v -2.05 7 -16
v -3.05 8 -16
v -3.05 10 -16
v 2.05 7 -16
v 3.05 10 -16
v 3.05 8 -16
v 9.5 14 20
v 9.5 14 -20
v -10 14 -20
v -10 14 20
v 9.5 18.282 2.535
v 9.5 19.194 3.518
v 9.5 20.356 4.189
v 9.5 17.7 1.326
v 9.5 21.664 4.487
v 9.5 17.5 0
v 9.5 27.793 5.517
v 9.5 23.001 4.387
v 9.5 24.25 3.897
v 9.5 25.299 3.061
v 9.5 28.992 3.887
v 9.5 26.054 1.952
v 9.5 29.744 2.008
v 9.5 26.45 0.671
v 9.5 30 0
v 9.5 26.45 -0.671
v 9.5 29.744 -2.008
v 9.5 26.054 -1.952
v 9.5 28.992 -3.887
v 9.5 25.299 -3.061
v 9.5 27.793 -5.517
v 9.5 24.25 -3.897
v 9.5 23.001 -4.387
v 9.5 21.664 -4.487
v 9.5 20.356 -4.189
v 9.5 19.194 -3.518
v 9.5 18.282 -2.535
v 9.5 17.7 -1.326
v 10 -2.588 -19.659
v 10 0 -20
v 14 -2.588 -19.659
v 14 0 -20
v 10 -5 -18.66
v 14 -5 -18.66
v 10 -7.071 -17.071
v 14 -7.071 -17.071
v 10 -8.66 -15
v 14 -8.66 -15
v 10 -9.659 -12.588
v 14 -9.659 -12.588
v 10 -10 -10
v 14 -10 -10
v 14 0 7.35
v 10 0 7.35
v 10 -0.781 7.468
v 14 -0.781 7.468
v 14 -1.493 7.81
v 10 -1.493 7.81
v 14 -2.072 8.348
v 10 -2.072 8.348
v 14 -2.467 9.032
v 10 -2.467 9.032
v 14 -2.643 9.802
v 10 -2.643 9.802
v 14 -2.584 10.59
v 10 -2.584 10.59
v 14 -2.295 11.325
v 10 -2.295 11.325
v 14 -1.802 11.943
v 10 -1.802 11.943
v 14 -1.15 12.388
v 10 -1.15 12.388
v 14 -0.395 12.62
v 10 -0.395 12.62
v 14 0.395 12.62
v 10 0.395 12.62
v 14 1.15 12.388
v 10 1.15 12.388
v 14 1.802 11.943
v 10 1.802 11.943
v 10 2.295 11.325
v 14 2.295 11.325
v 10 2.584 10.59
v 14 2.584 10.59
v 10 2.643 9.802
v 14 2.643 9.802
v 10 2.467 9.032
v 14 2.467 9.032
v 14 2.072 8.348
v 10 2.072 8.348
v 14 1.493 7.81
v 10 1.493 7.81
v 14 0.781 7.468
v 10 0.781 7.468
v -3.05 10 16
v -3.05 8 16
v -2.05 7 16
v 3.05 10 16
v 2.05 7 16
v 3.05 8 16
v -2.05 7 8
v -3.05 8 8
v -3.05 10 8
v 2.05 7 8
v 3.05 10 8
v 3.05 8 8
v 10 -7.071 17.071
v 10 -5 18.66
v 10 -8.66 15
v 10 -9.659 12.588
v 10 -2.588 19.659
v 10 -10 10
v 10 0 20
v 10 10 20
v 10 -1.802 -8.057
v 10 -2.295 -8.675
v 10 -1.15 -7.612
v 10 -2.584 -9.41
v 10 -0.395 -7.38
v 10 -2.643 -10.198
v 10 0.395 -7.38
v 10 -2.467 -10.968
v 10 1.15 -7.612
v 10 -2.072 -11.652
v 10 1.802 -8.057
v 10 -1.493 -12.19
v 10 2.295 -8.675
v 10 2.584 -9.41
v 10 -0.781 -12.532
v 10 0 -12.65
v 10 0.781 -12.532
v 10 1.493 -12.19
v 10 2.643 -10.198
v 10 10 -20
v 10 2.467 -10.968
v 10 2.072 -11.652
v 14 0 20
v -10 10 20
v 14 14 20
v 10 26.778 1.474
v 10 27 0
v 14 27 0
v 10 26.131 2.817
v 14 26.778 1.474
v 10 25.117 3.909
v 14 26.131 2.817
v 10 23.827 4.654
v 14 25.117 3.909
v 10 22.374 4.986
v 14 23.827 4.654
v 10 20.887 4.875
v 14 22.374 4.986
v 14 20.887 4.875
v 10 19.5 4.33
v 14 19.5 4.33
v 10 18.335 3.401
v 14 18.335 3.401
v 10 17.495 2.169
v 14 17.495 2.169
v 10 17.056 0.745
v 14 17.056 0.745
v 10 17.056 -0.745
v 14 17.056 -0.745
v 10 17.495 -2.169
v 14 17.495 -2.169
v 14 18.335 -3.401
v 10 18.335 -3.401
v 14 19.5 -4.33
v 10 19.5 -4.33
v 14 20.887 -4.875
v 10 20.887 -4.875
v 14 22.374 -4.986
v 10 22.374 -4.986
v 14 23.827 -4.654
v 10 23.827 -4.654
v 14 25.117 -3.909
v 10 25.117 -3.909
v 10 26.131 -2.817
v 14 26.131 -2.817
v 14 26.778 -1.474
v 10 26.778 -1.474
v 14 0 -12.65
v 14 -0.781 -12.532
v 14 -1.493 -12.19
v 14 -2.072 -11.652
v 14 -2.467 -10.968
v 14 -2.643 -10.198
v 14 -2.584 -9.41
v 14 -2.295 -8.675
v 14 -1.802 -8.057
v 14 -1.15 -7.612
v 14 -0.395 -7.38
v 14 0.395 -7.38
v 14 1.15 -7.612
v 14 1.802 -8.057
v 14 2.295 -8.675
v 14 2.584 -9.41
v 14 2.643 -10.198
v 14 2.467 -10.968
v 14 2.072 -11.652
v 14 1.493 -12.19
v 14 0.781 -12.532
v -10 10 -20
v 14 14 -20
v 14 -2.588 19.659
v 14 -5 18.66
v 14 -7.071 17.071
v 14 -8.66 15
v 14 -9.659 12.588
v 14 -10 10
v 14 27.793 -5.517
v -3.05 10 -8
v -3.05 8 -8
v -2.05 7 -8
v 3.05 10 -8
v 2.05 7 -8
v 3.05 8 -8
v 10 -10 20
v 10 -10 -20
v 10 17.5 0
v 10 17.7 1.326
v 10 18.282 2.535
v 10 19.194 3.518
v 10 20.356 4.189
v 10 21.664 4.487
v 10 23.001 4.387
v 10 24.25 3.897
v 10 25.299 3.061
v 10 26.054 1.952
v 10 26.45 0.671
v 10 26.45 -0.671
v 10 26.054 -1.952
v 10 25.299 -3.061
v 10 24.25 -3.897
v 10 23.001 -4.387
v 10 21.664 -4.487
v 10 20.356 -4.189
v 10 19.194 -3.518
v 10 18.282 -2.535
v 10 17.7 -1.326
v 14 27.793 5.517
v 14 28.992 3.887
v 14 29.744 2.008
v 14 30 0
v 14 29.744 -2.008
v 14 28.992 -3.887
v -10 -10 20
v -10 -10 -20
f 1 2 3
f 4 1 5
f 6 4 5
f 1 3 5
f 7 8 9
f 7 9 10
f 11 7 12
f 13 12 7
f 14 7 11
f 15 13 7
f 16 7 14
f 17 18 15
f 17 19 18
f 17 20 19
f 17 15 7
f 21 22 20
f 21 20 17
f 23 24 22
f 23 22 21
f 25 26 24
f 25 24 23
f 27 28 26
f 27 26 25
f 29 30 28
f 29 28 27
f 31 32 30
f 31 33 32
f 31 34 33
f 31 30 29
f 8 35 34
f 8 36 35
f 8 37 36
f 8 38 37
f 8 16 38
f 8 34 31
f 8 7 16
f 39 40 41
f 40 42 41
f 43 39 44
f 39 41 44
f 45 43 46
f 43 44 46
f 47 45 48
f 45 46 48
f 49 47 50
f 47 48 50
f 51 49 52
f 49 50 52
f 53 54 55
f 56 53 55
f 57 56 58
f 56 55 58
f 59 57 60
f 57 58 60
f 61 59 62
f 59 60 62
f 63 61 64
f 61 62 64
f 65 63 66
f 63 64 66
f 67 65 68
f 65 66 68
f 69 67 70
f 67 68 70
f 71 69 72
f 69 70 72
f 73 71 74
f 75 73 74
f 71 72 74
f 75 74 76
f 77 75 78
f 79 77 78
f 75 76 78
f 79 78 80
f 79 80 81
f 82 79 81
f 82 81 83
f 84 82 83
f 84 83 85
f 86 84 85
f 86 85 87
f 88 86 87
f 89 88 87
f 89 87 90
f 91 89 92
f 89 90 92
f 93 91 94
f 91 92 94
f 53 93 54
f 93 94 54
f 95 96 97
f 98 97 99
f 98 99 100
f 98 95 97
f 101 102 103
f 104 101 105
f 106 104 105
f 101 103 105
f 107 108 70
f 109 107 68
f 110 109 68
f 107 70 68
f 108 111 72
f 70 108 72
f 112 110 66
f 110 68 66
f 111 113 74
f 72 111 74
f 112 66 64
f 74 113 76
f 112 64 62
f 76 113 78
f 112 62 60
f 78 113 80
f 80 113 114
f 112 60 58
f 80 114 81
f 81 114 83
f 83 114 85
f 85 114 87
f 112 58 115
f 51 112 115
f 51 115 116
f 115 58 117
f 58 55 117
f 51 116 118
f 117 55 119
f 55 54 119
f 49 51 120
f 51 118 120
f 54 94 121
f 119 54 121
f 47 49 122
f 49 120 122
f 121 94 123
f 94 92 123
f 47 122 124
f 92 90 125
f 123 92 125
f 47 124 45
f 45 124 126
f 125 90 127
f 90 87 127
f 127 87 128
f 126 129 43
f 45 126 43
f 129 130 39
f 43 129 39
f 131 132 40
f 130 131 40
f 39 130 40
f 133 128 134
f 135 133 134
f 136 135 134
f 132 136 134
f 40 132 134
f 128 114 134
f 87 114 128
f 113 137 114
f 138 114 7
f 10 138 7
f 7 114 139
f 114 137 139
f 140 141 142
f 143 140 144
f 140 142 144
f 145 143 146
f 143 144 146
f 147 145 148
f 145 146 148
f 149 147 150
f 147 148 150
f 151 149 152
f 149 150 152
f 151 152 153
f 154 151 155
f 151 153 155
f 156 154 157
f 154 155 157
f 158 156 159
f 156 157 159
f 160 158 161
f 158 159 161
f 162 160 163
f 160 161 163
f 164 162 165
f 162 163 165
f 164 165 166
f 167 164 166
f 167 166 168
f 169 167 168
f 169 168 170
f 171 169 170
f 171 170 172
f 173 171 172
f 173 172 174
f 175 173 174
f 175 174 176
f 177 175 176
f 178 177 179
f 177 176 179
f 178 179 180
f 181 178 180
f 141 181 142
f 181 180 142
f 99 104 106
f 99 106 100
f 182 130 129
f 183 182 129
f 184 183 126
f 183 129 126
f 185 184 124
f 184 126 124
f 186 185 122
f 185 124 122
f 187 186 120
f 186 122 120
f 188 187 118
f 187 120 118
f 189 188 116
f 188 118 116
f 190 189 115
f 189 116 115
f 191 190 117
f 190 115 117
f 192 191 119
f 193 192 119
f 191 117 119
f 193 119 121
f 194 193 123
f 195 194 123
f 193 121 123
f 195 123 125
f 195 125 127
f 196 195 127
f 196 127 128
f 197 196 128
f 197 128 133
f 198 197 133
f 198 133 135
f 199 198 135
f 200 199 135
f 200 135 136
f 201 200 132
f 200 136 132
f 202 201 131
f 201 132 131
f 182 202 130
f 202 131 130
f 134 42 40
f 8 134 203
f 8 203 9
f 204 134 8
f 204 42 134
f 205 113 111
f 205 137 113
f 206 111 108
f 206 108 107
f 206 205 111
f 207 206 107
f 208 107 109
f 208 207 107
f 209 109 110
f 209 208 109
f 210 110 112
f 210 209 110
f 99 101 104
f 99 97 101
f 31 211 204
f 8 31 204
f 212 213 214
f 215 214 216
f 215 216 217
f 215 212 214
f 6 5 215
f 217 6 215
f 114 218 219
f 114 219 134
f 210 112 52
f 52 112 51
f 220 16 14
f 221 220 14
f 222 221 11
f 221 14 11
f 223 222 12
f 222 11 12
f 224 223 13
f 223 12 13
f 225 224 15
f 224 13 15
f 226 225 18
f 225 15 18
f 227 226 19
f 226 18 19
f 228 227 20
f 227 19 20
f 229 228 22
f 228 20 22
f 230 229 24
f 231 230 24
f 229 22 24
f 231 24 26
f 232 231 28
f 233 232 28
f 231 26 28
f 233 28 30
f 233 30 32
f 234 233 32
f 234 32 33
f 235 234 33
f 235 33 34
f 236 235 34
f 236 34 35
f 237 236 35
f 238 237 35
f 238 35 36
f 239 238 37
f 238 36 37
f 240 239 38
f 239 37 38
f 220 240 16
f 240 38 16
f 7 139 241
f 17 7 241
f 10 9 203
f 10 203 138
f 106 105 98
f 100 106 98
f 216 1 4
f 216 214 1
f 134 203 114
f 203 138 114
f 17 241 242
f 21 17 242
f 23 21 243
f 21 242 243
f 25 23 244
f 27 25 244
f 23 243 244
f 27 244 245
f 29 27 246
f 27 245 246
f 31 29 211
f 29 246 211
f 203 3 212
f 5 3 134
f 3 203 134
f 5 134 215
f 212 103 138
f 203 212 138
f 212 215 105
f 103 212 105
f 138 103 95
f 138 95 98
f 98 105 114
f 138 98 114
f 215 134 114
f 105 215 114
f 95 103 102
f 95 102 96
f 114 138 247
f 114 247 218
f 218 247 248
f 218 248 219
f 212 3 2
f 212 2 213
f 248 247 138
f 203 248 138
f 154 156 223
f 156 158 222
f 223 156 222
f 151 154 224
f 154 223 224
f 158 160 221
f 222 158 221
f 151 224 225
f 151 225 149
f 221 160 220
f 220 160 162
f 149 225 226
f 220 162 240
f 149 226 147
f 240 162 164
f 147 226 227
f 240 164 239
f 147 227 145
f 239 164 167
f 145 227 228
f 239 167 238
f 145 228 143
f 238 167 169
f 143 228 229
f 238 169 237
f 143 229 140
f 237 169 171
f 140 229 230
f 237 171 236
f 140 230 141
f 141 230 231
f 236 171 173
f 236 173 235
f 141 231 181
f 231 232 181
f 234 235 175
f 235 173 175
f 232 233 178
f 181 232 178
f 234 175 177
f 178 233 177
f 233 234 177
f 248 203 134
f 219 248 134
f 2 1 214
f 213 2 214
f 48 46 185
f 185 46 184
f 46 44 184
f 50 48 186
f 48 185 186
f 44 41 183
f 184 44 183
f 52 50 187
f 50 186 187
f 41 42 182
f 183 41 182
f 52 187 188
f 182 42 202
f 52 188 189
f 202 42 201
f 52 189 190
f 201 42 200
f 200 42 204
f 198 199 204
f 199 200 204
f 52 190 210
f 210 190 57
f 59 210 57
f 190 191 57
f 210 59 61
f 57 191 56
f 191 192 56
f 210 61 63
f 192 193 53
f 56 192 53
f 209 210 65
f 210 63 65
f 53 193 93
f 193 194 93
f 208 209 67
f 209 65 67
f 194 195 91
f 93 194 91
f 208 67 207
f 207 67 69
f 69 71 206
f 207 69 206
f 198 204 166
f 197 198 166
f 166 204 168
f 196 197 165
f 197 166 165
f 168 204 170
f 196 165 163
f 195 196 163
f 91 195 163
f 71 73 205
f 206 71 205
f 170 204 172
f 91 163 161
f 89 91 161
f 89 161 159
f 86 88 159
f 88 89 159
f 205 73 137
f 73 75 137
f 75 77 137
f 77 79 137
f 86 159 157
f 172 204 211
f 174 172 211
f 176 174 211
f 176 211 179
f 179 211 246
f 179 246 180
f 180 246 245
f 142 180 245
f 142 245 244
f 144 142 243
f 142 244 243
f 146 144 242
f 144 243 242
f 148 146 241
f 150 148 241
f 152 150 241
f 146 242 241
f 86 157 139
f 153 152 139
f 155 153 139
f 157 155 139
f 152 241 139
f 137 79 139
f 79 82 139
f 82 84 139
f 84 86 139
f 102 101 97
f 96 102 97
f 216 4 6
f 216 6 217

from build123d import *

# Parameters (mm, degrees)
SKETCH_2_W                 = 20
SKETCH_2_H                 = 20
EXTRUDE_1_DEPTH            = 20
SKETCH_3_W                 = 40
SKETCH_3_H                 = 24
EXTRUDE_2_DEPTH            = 4
SKETCH_5_W                 = 2.65
SKETCH_5_H                 = 24
HOLE_WIZARD_M51_AT_2_COUNT = 2
HOLE_WIZARD_M51_AT_2_PITCH = 20
SKETCH_6_W                 = 40
SKETCH_6_H                 = 4
EXTRUDE_3_DEPTH            = 20
SKETCH_7_W                 = 6.1
SKETCH_7_H                 = 8
EXTRUDE_4_DEPTH            = 3
CHAMFER_1_SIZE             = 1
SKETCH_8_R                 = 5
EXTRUDE_5_DEPTH            = 4.5
SKETCH_9_R                 = 5
SKETCH_9_R_2               = 4.5
EXTRUDE_6_DEPTH            = 0.5
FILLET_1_R                 = 10


with BuildPart() as part:
    # Эскиз2 → Бобышка-Вытянуть1 (new, symmetric)
    with BuildSketch(Plane.XY):
        Rectangle(SKETCH_2_W, SKETCH_2_H)
    extrude(amount=EXTRUDE_1_DEPTH, both=True)


with BuildPart() as body_2:
    # Эскиз3 → Бобышка-Вытянуть2 (new body)
    with BuildSketch(Plane(origin=(10, 0, 0), x_dir=(0, 0, -1), z_dir=(1, 0, 0))):
        with Locations((0, 2)):
            Rectangle(SKETCH_3_W, SKETCH_3_H)
    extrude(amount=EXTRUDE_2_DEPTH)

    # Эскиз5 → Отверстие с зазором M51 (revolve, cut)
    with BuildSketch(Plane(origin=(14, 0, 10), x_dir=(0, 0, -1), z_dir=(0, 1, 0))):
        with Locations((1.325, 12)):
            Rectangle(SKETCH_5_W, SKETCH_5_H)
    hole_wizard_m51 = revolve(axis=Axis((20.35, 0, 10), (-1, 0, 0)), mode=Mode.SUBTRACT)

    # Отверстие с зазором M51 at 2: Отверстие с зазором M51 ×2
    with Locations(*[(0, 0, -i * HOLE_WIZARD_M51_AT_2_PITCH) for i in range(1, HOLE_WIZARD_M51_AT_2_COUNT)]):
        add(hole_wizard_m51, mode=Mode.SUBTRACT)

    # Эскиз6 → Бобышка-Вытянуть3 (add)
    with BuildSketch(Plane.ZY.offset(-10)):
        with Locations((0, 12)):
            Rectangle(SKETCH_6_W, SKETCH_6_H)
    extrude(amount=EXTRUDE_3_DEPTH)

    # Эскиз7 → Бобышка-Вытянуть4 (add)
    with BuildSketch(Plane.XZ.offset(-10)):
        with Locations((0, 12)):
            Rectangle(SKETCH_7_W, SKETCH_7_H)
        with Locations((0, -12)):
            Rectangle(SKETCH_7_W, SKETCH_7_H)
    extrude(amount=EXTRUDE_4_DEPTH)

    # Фаска1
    chamfer_1_edges = [body_2.edges().sort_by_distance(p)[0] for p in [
        (-3.05, 7, 12),
        (3.05, 7, 12),
        (-3.05, 7, -12),
        (3.05, 7, -12),
    ]]
    chamfer(chamfer_1_edges, length=CHAMFER_1_SIZE)

    # Эскиз8 → Бобышка-Вытянуть5 (add)
    with BuildSketch(Plane(origin=(14, 0, 0), x_dir=(0, 0, -1), z_dir=(1, 0, 0))):
        with BuildLine():
            ThreePointArc((-5.517241379, 27.793103448), (0, 30), (5.517241379, 27.793103448))
            Line((5.517241379, 27.793103448), (20, 14))
            Line((20, 14), (-20, 14))
            Line((-20, 14), (-5.517241379, 27.793103448))
        make_face()
        with Locations(Location((0, 22, 0), (0, 0, 90))):
            Circle(SKETCH_8_R, mode=Mode.SUBTRACT)
    extrude(amount=-EXTRUDE_5_DEPTH)

    # Эскиз9 → Бобышка-Вытянуть6 (add)
    with BuildSketch(Plane.ZY.offset(-9.5)):
        with Locations(Location((0, 22, 0), (0, 0, 90))):
            Circle(SKETCH_9_R)
        with Locations(Location((0, 22, 0), (0, 0, 270))):
            Circle(SKETCH_9_R_2, mode=Mode.SUBTRACT)
    extrude(amount=-EXTRUDE_6_DEPTH)

    # Скругление1
    fillet_1_edges = [body_2.edges().sort_by_distance(p)[0] for p in [
        (12, -10, -20),
        (12, -10, 20),
    ]]
    fillet(fillet_1_edges, radius=FILLET_1_R)


solid = Compound([part.part, body_2.part])
